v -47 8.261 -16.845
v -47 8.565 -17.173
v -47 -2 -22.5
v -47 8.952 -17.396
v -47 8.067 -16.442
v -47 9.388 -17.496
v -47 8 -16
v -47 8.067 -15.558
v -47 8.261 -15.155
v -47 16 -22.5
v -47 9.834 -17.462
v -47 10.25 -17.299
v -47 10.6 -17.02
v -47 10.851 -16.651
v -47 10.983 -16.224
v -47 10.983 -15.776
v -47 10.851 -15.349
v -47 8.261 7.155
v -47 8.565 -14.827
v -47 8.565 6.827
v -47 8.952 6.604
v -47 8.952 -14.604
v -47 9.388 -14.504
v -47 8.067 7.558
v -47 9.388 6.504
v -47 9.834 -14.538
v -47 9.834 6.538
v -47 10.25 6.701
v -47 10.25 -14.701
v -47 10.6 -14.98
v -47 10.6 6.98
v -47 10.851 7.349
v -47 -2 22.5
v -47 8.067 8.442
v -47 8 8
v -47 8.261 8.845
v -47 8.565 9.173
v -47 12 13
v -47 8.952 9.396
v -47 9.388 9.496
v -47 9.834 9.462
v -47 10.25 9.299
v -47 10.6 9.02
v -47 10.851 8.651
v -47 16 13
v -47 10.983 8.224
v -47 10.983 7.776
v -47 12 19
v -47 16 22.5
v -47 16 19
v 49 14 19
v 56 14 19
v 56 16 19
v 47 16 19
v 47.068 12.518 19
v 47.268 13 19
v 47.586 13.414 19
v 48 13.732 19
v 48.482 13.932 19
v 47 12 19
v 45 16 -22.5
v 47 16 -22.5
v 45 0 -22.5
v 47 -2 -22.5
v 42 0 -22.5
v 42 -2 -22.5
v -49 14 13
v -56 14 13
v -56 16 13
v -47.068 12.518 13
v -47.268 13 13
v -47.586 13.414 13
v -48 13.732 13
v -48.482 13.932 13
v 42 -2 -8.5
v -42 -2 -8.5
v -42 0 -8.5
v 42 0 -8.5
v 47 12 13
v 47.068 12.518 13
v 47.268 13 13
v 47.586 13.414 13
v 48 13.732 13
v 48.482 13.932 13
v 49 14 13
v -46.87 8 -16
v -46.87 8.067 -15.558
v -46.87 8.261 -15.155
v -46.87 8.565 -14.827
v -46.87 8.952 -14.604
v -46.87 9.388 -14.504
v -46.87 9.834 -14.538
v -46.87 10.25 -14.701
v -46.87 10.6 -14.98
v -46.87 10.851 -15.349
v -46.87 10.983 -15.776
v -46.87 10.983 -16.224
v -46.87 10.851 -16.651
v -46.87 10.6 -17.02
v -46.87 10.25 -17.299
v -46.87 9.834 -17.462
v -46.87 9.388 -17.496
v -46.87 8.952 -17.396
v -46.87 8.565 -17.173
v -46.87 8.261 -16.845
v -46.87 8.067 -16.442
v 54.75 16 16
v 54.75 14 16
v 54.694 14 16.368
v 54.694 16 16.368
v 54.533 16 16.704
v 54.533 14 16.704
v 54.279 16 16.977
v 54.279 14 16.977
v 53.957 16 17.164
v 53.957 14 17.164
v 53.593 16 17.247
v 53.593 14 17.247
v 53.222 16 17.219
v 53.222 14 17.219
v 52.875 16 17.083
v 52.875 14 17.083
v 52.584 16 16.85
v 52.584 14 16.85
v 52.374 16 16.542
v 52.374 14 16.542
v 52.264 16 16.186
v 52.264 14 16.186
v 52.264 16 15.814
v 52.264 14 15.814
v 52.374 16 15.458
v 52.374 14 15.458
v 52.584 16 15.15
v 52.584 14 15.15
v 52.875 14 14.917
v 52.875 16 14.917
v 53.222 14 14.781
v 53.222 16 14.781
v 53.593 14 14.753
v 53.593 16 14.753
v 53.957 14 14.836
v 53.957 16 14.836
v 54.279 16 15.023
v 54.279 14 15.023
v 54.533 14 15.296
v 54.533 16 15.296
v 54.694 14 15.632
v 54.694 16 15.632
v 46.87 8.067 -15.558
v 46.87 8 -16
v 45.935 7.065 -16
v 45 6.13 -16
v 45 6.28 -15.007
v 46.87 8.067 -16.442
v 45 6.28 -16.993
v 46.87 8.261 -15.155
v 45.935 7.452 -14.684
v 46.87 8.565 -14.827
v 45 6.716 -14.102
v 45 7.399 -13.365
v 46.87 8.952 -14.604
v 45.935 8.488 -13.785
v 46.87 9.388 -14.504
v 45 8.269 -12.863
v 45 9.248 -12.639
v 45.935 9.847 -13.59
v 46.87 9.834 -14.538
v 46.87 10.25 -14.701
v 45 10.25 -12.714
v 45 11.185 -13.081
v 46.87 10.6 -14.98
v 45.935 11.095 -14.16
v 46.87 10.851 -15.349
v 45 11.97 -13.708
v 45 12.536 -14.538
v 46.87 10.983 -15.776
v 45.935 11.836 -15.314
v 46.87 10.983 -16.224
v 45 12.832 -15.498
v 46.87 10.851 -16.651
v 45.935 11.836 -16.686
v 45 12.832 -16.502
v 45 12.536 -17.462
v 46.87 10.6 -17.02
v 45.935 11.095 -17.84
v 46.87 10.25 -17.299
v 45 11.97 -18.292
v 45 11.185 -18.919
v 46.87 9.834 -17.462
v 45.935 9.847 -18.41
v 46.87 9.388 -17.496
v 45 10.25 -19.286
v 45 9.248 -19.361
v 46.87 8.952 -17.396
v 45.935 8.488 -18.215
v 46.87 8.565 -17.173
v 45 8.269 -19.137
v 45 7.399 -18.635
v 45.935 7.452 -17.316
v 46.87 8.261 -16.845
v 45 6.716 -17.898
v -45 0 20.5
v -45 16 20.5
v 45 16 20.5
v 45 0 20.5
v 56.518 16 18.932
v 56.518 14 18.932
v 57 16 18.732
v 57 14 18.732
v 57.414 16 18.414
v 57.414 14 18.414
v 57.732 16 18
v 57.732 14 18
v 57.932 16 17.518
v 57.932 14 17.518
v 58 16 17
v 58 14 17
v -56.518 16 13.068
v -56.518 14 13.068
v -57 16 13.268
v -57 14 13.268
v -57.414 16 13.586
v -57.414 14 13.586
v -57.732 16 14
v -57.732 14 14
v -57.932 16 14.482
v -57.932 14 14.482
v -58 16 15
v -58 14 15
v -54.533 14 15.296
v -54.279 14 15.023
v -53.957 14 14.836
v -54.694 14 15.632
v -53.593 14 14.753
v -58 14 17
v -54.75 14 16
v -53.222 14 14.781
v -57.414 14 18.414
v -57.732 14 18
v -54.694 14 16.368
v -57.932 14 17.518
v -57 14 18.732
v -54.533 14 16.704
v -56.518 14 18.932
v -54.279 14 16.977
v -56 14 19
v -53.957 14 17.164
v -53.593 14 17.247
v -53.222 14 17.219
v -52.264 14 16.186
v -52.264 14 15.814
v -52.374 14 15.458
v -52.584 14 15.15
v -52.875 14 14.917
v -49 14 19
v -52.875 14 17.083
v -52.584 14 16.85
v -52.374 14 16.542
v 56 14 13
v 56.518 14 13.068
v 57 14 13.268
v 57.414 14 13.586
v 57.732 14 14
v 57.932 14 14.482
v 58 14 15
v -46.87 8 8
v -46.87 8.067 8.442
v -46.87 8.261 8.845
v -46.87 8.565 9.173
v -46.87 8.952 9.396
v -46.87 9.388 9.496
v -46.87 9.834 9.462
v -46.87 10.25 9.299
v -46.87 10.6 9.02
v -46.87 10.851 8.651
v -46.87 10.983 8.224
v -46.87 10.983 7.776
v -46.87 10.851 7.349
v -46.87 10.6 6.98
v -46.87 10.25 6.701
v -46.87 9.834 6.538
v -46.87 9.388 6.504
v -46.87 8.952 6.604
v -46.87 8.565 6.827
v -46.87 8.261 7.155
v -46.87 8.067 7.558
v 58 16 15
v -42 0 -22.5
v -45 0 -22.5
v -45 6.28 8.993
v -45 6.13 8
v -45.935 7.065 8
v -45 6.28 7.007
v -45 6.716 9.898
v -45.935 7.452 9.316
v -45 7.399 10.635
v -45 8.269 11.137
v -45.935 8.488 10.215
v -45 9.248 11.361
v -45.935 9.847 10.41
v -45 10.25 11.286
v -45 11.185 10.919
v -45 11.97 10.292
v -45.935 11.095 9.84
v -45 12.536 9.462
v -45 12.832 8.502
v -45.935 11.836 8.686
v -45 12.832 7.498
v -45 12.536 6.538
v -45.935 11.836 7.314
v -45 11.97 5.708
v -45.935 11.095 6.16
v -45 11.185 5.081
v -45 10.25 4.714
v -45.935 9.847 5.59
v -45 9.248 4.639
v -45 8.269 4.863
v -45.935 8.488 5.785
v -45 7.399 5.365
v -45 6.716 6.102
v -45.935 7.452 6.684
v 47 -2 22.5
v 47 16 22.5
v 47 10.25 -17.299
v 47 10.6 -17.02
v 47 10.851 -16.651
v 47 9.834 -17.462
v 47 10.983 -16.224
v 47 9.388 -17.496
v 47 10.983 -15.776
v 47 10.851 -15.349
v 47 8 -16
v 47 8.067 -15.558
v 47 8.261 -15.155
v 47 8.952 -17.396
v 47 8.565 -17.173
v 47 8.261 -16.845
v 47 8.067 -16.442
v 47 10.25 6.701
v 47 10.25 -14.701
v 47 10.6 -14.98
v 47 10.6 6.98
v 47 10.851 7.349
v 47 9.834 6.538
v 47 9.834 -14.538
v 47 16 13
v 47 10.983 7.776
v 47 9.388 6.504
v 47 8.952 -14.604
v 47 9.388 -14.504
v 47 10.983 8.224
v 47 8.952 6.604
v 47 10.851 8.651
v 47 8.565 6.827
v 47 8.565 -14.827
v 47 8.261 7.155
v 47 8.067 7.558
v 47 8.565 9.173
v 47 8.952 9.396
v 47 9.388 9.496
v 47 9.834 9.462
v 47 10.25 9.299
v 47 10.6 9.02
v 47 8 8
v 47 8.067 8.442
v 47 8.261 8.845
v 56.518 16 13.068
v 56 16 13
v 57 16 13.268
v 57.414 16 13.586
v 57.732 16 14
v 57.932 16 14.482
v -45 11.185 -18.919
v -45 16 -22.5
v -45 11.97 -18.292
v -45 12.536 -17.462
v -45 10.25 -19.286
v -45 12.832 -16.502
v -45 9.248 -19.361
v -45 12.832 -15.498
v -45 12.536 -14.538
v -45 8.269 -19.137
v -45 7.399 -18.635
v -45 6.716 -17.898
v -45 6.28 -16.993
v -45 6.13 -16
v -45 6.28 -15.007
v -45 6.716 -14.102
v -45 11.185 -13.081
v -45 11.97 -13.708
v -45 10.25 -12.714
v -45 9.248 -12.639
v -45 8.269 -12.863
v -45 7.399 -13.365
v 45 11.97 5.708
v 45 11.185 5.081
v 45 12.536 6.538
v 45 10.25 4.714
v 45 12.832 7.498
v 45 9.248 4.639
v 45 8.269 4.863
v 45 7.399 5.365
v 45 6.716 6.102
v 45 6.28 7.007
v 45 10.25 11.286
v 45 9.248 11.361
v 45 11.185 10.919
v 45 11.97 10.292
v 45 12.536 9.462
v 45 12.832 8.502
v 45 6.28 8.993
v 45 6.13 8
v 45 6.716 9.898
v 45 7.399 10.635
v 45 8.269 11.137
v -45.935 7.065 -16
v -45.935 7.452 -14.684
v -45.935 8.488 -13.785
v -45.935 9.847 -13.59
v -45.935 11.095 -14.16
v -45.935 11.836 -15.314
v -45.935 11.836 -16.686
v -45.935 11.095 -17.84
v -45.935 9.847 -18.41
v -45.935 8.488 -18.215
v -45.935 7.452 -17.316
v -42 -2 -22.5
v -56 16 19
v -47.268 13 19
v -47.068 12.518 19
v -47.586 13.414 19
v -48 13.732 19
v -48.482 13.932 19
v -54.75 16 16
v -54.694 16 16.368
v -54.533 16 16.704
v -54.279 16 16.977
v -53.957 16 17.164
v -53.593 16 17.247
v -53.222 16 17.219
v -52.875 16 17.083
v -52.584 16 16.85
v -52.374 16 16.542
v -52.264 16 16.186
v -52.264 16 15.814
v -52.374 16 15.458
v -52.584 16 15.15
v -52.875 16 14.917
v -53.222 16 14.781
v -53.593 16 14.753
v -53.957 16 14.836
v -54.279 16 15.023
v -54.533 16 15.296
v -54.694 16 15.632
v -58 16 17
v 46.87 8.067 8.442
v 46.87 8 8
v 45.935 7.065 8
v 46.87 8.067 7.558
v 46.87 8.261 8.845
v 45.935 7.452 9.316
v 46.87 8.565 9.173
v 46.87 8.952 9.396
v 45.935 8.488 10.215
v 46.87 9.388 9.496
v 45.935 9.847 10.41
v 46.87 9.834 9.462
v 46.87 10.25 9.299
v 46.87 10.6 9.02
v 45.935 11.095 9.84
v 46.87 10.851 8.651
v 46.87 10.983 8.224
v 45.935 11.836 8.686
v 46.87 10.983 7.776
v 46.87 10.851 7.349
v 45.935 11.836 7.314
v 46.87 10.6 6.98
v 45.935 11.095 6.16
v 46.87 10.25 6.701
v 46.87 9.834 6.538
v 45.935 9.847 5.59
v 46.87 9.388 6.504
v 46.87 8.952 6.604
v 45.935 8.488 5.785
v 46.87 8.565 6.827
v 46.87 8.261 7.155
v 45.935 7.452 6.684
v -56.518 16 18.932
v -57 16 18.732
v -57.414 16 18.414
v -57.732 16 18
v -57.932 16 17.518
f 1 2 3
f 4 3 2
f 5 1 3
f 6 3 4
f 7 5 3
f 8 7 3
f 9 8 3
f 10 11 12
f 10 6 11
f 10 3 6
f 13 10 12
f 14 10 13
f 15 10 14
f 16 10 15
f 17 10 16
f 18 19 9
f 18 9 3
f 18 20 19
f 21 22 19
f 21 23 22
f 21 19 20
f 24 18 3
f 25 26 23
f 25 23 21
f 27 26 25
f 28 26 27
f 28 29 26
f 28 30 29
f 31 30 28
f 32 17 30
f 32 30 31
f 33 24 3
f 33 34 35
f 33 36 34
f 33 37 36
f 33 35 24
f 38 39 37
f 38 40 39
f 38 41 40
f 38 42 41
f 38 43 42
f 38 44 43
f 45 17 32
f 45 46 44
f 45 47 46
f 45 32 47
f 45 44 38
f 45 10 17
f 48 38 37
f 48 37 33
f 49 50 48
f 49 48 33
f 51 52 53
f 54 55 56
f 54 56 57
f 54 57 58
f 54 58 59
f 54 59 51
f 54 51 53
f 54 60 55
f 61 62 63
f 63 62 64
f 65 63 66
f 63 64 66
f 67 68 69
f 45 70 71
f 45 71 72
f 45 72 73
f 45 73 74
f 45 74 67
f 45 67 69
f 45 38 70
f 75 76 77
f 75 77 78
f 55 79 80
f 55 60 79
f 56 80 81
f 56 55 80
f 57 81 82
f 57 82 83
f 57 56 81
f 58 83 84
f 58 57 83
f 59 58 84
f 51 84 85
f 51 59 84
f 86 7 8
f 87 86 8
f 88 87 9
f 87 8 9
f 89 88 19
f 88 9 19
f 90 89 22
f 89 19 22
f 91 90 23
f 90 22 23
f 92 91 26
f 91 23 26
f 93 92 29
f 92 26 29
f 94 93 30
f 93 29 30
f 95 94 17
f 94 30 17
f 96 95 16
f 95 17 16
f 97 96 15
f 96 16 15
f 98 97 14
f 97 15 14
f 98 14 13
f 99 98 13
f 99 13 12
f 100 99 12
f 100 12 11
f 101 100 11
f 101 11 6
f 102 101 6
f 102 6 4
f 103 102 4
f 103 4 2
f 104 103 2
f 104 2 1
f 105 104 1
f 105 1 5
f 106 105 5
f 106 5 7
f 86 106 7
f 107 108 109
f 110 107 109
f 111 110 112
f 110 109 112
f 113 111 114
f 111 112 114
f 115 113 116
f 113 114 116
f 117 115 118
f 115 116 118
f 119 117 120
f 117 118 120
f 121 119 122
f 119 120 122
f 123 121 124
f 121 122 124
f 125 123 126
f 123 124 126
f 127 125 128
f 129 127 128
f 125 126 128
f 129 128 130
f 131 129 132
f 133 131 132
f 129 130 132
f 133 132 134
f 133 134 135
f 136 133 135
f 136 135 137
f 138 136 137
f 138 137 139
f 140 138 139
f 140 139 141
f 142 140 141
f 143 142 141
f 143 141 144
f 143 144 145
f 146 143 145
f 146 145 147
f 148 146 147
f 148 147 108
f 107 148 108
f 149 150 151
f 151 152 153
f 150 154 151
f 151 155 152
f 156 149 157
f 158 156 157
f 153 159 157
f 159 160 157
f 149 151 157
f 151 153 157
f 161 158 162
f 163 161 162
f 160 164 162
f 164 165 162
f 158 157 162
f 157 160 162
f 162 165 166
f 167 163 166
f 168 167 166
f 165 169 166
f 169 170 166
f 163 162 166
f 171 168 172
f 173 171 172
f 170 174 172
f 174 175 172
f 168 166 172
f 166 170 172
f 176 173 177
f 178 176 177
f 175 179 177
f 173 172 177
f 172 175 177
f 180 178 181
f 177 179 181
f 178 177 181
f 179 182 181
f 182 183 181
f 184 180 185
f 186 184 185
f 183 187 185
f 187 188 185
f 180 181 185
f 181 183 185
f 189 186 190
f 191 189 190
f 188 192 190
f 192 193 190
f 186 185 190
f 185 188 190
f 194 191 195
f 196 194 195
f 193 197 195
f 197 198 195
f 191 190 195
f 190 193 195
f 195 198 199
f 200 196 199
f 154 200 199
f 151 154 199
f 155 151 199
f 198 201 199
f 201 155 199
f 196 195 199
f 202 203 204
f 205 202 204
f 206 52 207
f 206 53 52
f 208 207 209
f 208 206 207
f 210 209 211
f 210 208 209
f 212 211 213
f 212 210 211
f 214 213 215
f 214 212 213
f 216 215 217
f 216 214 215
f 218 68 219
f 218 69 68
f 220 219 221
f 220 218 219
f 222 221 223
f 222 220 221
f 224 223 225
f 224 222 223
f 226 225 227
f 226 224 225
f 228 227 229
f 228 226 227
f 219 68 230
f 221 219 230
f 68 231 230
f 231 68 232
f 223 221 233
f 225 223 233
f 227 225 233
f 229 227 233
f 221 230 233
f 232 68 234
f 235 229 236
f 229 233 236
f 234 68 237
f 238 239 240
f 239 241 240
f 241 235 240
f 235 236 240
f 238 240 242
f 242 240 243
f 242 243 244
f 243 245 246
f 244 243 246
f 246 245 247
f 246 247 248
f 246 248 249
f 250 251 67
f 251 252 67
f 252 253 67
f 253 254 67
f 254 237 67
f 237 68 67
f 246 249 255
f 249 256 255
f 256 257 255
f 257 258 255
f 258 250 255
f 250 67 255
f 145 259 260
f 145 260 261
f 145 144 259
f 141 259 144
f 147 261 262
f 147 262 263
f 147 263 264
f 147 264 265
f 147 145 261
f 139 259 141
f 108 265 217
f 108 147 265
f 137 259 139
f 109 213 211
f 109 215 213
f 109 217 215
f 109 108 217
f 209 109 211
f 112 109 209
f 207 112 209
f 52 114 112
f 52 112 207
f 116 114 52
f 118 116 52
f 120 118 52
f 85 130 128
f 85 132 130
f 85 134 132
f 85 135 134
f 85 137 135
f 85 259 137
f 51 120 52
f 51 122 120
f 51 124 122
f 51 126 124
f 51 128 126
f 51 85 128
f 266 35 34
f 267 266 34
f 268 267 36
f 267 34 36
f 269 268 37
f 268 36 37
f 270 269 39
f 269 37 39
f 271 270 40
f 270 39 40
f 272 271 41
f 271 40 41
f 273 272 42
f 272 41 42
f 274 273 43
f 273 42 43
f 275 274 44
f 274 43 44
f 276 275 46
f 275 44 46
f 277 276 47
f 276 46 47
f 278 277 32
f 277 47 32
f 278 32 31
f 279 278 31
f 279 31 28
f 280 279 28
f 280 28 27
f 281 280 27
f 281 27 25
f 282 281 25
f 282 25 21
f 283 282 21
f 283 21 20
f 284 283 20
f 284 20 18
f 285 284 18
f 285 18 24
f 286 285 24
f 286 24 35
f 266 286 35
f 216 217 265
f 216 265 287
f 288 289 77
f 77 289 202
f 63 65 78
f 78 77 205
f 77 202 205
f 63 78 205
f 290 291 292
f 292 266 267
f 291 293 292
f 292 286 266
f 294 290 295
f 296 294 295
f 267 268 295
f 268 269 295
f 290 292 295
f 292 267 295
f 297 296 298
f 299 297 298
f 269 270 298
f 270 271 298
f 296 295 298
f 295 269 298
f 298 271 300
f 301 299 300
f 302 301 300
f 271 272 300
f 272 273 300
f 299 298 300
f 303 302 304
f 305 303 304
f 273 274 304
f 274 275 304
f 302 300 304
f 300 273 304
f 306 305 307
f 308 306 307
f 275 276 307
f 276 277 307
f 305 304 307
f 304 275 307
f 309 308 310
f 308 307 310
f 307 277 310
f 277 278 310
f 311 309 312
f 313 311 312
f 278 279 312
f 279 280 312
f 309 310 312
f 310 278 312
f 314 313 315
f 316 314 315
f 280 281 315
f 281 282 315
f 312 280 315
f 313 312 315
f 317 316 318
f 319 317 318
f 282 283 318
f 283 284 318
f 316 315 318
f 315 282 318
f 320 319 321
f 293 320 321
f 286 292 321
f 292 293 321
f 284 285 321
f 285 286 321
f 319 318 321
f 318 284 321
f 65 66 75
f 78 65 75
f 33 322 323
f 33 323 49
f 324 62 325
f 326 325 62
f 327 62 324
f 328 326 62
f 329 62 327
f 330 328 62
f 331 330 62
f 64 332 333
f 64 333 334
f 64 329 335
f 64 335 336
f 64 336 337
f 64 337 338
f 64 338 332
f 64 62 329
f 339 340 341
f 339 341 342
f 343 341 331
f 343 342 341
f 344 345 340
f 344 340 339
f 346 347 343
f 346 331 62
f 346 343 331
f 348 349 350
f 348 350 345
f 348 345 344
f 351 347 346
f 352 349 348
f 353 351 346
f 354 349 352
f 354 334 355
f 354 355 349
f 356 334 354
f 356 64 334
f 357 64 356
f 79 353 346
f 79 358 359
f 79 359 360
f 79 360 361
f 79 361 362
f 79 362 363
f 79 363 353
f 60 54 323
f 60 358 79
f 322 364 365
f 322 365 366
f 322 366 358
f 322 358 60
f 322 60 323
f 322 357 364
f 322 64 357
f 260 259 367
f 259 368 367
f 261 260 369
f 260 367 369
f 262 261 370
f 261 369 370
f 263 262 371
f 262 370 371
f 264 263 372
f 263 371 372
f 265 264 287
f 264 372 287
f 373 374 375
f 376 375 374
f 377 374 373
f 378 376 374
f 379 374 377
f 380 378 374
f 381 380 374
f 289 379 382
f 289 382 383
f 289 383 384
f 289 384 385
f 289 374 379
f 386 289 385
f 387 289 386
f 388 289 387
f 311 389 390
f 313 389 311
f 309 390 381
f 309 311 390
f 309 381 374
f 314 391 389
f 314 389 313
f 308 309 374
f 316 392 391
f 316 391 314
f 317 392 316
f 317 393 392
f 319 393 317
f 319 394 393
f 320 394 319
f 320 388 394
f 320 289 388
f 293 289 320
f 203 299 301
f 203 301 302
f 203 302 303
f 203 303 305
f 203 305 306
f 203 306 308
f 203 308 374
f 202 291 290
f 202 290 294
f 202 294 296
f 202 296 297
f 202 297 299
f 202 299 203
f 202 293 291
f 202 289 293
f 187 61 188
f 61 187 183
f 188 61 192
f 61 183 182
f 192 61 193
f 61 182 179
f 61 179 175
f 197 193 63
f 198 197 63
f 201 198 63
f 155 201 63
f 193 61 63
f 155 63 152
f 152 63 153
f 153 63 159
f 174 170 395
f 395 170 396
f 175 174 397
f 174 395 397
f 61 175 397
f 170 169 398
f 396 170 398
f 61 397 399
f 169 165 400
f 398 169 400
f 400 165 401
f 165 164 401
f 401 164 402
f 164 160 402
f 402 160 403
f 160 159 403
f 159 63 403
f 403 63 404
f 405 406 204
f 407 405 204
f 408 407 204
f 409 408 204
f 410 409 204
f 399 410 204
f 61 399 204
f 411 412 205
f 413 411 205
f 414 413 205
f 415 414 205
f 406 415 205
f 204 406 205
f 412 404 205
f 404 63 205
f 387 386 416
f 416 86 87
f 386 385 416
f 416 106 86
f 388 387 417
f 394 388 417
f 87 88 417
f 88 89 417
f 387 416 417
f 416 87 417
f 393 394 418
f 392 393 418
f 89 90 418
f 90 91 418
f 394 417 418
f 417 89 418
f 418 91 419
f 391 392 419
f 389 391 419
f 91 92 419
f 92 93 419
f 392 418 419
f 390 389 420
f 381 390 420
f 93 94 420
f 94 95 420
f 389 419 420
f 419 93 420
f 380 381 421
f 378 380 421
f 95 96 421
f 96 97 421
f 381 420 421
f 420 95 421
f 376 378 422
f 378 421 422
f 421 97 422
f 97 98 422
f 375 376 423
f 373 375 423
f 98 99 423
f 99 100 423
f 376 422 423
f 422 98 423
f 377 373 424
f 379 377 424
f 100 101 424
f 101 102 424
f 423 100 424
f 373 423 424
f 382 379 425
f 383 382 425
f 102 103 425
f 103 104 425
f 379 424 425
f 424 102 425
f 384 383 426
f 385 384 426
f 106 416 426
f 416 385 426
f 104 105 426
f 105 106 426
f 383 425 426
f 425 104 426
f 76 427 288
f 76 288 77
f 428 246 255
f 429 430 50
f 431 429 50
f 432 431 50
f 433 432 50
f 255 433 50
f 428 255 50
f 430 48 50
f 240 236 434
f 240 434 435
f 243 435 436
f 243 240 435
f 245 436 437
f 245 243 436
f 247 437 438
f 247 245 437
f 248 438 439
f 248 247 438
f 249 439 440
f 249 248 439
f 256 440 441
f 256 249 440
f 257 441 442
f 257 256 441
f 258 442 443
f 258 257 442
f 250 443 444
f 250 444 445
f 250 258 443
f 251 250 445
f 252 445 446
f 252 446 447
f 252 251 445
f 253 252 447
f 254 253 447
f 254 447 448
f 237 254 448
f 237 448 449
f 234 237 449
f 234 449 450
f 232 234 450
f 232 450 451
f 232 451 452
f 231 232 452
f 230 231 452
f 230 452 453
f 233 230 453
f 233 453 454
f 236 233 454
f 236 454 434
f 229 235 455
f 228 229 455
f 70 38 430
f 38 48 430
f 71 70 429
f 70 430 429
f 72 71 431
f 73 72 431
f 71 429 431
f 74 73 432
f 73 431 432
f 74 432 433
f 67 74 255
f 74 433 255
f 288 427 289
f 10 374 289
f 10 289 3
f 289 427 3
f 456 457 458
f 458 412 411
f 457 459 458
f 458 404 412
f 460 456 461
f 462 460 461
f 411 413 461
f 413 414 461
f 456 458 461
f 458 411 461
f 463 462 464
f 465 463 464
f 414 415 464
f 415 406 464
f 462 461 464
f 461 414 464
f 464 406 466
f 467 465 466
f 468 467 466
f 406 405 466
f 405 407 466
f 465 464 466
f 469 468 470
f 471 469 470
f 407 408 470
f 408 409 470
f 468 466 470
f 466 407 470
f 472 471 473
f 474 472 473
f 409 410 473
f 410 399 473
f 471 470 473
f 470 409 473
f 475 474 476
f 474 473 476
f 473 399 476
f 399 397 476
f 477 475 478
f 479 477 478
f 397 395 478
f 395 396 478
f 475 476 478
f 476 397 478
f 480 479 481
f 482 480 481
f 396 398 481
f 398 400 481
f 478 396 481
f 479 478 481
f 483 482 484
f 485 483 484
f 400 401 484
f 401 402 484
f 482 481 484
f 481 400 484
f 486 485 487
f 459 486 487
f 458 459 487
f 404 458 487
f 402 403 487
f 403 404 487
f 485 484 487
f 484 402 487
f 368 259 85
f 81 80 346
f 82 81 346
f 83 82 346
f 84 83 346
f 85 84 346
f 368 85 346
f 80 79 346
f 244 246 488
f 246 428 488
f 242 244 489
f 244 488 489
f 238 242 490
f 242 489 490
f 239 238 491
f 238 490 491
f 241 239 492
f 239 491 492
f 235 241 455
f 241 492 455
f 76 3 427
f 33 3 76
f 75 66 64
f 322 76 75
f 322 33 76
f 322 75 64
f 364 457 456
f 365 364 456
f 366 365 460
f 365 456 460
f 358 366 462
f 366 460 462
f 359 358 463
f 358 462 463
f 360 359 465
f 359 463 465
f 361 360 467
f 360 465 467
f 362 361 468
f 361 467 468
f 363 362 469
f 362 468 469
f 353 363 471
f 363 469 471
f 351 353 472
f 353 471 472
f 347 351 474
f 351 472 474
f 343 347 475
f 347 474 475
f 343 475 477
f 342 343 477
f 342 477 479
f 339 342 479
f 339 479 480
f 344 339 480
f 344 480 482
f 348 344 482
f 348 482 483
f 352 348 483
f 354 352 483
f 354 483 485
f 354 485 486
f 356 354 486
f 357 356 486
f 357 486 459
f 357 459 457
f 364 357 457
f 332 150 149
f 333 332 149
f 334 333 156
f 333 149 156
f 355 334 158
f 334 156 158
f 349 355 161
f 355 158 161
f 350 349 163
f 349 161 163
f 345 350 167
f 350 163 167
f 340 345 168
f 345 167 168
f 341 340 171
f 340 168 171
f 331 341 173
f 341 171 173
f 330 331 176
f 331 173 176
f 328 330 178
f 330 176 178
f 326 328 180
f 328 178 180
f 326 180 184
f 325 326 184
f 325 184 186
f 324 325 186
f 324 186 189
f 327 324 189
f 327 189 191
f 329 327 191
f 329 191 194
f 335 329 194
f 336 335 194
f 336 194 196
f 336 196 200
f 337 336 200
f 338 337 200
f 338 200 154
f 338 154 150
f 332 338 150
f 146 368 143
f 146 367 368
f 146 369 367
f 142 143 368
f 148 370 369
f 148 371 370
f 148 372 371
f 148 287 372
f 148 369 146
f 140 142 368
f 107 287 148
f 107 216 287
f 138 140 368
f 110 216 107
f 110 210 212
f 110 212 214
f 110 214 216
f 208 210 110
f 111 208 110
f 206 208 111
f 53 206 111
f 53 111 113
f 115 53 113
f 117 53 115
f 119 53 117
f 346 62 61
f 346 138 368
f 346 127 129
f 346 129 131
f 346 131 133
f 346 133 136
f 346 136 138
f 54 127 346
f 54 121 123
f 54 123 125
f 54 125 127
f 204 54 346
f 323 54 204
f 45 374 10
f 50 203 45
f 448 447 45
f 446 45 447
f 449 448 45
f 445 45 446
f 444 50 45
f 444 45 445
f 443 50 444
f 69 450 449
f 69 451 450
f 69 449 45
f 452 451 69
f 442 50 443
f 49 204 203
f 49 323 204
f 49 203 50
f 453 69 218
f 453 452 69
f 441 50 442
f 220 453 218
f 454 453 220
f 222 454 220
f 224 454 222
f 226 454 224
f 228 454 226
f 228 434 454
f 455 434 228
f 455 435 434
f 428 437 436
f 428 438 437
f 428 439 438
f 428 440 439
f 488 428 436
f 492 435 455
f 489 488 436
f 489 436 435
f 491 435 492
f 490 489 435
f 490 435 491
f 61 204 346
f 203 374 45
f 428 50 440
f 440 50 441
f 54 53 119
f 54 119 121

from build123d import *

# Parameters (mm, degrees)
F0_W      = 94
F0_H      = 45
F1_DEPTH  = 2
F2_W      = 2
F2_H      = 45
F3_DEPTH  = 16
F4_W      = 94
F4_H      = 18
F5_DEPTH  = 2
F6_W      = 2
F6_H      = 6
F7_DEPTH  = 11
F8_R      = 1.25
F8_R_2    = 1.5
F9_DEPTH  = 25
F10_R     = 2
F12_W     = 19.2678107619
F12_H     = 14.8564111814
F12_W_2   = 16.8835728168
F12_H_2   = 15.2771589719
F13_DEPTH = 25
F14_R     = 1.5
F15_DEPTH = 100
F16_R     = 1.5
F17_DEPTH = 100
F18_SIZE  = 1.87
F19_W     = 84
F19_H     = 28
F20_DEPTH = 25


with BuildPart() as f1:
    # F0 (on Front) → F1 (new body)
    with BuildSketch(Plane.XZ):
        Rectangle(F0_W, F0_H)
    extrude(amount=F1_DEPTH)

    # F2 (on face) → F3 (join)
    with BuildSketch(Plane(origin=(0, 0, 0), x_dir=(-1, 0, 0), z_dir=(0, 1, 0))):
        with Locations((-46, 0)):
            Rectangle(F2_W, F2_H)
        with Locations((46, 0)):
            Rectangle(F2_W, F2_H)
    extrude(amount=F3_DEPTH)

    # F4 (on face) → F5 (join)
    with BuildSketch(Plane.XY.offset(22.5)):
        with Locations((0, 7)):
            Rectangle(F4_W, F4_H)
    extrude(amount=-F5_DEPTH)

    # F6 (on face) → F7 (join)
    with BuildSketch(Plane.YZ.offset(47)):
        with Locations((15, 16)):
            Rectangle(F6_W, F6_H)
        with Locations((15, -16)):
            Rectangle(F6_W, F6_H)
    extrude(amount=F7_DEPTH)

    # F8 (on face) → F9 (cut)
    with BuildSketch(Plane.XZ.offset(-14)):
        with Locations((53.5, 16)):
            Circle(F8_R)
        with Locations((53.5, -16)):
            Circle(F8_R_2)
    extrude(amount=-F9_DEPTH, mode=Mode.SUBTRACT)

    # F10
    f10_edges = [f1.edges().sort_by_distance(p)[0] for p in [
        (58, 15, -19),
        (58, 15, -13),
        (58, 15, 19),
        (58, 15, 13),
        (47, 14, -16),
        (47, 14, 16),
    ]]
    fillet(f10_edges, radius=F10_R)

    # F11: F1 across plane


with BuildPart() as f1_1:
    add(f1.part)
    add(f1.part.mirror(Plane.YZ))

    # F12 (on face) → F13 (cut)
    with BuildSketch(Plane.XZ.offset(2)):
        with Locations((56.633905381, -15.0717944093)):
            Rectangle(F12_W, F12_H)
        with Locations((-55.4417864084, -14.8614205141)):
            Rectangle(F12_W_2, F12_H_2)
    extrude(amount=-F13_DEPTH, mode=Mode.SUBTRACT)

    # F14 (on face) → F15 (cut)
    with BuildSketch(Plane(origin=(-47, 0, 0), x_dir=(0, -1, 0), z_dir=(-1, 0, 0))):
        with Locations((-9.5, -16)):
            Circle(F14_R)
    extrude(amount=-F15_DEPTH, mode=Mode.SUBTRACT)

    # F16 (on face) → F17 (cut)
    with BuildSketch(Plane(origin=(-47, 0, 0), x_dir=(0, -1, 0), z_dir=(-1, 0, 0))):
        with Locations((-9.5, 8)):
            Circle(F16_R)
    extrude(amount=-F17_DEPTH, mode=Mode.SUBTRACT)

    # F18
    f18_edges = [f1_1.edges().sort_by_distance(p)[0] for p in [
        (45, 11, 8),
        (45, 11, -16),
        (-45, 11, 8),
        (-45, 11, -16),
    ]]
    chamfer(f18_edges, length=F18_SIZE)

    # F19 (on face) → F20 (cut)
    with BuildSketch(Plane.XZ.offset(2)):
        with Locations((0, -22.5)):
            Rectangle(F19_W, F19_H)
    extrude(amount=-F20_DEPTH, mode=Mode.SUBTRACT)


solid = f1_1.part
